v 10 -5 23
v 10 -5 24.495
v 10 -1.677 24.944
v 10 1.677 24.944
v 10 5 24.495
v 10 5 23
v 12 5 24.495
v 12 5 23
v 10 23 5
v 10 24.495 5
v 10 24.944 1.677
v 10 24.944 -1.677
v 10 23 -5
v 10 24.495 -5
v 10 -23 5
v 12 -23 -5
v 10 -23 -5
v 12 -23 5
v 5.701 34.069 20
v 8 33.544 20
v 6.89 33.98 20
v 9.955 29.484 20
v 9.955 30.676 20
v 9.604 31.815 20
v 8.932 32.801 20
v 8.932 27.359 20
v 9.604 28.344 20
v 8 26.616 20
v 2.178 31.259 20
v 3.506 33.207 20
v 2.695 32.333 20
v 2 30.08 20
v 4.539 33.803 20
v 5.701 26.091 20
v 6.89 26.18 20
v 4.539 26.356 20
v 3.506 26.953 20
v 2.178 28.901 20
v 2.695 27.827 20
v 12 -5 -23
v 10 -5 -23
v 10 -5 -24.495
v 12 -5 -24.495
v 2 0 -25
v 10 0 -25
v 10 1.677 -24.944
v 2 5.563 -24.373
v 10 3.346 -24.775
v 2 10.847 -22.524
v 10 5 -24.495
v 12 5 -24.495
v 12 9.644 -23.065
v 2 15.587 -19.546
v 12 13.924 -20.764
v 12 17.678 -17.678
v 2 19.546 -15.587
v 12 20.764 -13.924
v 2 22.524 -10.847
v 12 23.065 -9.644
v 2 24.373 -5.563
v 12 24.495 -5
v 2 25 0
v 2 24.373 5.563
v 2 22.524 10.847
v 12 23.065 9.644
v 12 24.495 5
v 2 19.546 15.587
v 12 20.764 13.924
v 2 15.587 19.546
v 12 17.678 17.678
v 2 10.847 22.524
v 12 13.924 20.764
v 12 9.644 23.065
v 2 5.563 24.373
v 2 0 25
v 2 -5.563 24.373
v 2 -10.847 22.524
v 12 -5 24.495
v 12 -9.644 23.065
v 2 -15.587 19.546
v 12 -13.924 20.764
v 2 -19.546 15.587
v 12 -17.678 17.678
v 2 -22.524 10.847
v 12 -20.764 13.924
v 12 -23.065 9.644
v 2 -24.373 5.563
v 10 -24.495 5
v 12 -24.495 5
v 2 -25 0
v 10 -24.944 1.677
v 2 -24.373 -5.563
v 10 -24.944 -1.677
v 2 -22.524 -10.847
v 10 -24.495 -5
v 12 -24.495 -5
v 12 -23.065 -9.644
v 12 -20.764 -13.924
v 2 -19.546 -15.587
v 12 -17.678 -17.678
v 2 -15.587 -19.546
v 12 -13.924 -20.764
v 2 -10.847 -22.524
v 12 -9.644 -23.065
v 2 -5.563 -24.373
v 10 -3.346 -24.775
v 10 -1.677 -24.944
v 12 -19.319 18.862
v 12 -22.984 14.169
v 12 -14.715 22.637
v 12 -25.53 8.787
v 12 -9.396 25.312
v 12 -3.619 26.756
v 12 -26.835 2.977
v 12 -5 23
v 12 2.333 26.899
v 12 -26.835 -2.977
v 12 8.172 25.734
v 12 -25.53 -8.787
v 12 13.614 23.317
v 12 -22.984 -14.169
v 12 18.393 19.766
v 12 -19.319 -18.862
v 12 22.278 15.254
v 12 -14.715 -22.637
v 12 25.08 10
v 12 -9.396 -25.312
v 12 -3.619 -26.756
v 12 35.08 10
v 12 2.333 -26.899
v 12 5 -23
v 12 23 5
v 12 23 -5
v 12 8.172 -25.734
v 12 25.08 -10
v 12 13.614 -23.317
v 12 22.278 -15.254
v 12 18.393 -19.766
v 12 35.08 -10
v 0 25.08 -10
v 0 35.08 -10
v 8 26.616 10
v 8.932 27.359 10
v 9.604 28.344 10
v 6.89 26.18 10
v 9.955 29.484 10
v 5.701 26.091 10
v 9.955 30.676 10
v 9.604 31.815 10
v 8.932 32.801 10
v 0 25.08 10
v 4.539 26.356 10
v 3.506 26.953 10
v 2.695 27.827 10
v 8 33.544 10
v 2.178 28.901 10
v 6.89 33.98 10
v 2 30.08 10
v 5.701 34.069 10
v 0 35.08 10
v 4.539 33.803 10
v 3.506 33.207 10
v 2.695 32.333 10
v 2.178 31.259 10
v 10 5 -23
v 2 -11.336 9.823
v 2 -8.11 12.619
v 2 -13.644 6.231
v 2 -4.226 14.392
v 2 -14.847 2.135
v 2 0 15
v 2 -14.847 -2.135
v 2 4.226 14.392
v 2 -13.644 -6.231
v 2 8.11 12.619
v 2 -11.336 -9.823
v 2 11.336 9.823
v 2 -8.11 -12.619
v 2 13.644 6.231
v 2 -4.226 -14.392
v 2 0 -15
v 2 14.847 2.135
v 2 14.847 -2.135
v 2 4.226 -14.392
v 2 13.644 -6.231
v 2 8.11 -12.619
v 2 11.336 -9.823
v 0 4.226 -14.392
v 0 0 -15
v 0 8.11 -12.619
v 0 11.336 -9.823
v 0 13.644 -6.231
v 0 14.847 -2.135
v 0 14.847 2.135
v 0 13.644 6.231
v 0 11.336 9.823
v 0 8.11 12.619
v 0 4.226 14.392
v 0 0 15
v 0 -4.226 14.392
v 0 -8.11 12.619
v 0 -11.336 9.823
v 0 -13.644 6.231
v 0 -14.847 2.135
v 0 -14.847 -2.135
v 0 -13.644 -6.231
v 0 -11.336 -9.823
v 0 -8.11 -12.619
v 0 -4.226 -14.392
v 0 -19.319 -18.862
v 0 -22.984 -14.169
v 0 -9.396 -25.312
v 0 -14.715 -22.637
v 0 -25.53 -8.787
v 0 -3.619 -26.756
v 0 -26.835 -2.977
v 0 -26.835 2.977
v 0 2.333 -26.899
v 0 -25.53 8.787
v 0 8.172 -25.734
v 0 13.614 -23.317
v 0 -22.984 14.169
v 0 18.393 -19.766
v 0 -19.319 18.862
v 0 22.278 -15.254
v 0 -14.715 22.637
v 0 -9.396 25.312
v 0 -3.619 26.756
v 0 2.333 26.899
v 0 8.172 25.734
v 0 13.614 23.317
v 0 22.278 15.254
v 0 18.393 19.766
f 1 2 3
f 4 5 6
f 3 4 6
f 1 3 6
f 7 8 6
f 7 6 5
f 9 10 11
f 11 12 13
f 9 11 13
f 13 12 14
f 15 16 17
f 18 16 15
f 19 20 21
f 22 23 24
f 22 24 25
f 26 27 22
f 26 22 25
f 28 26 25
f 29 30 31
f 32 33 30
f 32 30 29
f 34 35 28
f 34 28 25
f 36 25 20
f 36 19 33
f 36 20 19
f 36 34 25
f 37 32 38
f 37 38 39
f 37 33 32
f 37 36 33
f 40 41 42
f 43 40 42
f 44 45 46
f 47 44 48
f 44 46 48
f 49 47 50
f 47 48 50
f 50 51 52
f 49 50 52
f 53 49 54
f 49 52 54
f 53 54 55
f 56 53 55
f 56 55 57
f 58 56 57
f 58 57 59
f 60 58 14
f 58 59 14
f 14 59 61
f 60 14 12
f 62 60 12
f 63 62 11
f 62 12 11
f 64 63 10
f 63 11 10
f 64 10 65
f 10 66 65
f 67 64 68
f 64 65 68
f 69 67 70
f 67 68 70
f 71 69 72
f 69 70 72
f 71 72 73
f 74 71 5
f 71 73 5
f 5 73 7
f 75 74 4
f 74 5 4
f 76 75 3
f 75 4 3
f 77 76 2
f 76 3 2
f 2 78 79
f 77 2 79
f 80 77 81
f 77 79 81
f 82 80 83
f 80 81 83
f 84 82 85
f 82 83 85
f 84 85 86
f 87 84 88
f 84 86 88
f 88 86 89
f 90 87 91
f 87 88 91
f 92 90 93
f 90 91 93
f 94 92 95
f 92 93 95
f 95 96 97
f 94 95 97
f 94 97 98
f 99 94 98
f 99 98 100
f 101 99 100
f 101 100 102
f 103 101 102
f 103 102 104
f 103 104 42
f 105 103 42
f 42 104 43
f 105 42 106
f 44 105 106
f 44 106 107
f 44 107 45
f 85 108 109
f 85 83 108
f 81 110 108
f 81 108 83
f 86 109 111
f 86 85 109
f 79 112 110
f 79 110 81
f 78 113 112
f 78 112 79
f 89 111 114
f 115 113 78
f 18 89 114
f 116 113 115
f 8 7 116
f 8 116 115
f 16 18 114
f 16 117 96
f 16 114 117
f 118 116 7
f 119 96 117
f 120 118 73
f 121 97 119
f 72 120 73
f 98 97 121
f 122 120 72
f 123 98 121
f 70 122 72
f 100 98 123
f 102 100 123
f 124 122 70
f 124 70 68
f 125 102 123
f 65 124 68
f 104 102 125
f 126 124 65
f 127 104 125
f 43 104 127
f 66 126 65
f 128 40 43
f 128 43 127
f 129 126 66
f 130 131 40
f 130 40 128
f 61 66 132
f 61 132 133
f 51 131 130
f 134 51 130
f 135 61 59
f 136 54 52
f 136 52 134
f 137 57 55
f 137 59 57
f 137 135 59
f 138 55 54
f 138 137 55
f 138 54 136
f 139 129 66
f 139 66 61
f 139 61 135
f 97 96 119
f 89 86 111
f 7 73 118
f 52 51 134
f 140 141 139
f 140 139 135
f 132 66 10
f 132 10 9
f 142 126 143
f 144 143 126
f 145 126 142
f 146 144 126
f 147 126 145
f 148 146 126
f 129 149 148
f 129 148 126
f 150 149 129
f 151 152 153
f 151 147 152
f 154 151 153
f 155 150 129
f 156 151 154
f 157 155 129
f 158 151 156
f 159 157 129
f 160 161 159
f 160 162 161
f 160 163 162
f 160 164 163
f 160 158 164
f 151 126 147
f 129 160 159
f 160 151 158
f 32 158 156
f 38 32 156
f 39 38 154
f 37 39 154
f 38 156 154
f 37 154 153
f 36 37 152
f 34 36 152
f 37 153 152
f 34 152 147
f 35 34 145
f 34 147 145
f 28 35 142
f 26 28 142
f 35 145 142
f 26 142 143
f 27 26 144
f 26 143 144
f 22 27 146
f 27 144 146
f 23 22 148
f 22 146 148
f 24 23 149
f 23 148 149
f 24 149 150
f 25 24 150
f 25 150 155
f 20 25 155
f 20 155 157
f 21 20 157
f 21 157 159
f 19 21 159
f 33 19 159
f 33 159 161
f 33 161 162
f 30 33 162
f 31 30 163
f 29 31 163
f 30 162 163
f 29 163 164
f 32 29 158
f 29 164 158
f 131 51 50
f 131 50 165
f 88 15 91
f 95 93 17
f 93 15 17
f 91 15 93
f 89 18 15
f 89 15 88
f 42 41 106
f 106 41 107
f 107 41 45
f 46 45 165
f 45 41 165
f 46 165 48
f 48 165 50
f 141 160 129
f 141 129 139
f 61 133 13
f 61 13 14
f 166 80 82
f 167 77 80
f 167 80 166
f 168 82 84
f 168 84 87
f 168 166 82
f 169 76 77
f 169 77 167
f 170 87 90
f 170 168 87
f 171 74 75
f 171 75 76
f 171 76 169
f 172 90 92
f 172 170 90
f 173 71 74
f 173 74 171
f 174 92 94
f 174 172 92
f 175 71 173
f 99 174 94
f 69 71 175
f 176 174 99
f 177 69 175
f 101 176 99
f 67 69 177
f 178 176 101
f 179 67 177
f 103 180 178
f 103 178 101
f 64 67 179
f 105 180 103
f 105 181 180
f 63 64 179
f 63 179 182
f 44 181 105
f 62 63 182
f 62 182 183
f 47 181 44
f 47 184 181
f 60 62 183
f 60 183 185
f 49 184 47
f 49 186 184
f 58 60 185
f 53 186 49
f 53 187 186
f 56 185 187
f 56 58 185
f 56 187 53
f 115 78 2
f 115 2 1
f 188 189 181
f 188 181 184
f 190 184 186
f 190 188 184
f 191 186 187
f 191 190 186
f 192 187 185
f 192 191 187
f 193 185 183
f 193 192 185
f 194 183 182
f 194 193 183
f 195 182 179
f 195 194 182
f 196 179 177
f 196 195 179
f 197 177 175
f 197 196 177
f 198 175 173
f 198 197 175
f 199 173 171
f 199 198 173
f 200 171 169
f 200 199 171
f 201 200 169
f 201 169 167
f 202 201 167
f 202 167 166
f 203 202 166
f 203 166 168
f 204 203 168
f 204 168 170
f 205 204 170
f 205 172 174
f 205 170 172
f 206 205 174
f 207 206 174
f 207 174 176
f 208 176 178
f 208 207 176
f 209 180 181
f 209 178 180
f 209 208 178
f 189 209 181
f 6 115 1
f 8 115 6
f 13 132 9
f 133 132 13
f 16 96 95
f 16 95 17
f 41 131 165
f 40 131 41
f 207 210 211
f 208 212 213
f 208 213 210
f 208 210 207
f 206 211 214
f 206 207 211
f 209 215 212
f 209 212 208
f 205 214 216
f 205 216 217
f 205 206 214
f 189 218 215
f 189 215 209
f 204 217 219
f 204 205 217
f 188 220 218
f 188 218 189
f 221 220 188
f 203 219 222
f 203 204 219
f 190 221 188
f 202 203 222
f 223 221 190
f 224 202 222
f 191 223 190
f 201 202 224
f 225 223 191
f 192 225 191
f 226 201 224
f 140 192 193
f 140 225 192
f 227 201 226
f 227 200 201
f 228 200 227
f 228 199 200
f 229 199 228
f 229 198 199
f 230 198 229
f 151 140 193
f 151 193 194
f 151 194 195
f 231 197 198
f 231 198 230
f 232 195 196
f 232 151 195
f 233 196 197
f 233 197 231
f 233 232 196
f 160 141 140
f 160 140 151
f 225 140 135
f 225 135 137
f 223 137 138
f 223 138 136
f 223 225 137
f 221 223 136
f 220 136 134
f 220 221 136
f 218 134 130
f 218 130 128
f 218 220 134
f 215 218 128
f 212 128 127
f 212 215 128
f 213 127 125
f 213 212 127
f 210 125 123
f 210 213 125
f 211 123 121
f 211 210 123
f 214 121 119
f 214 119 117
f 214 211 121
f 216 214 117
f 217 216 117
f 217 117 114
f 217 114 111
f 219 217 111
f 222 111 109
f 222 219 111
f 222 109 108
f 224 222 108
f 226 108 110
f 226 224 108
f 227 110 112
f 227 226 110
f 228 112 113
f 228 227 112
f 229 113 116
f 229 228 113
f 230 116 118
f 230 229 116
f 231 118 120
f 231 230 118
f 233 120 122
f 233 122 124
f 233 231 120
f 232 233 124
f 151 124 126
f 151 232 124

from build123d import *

# Parameters (mm, degrees)
SKETCH1_R           = 15
BOSS_EXTRUDE1_DEPTH = 12
SKETCH2_R           = 25
CUT_EXTRUDE1_DEPTH  = 10
SKETCH3_R           = 4
BOSS_EXTRUDE2_DEPTH = 10
BOSS_EXTRUDE3_DEPTH = 2


with BuildPart() as part:
    # Sketch1 → Boss-Extrude1 (new body)
    with BuildSketch(Plane(origin=(0, 0, 0), x_dir=(0, 0, -1), z_dir=(1, 0, 0))):
        with BuildLine():
            Line((-10, 25.079872408), (-10, 35.079872408))
            Line((-10, 35.079872408), (10, 35.079872408))
            Line((10, 35.079872408), (10, 25.079872408))
            ThreePointArc((10, 25.079872408), (0, -27), (-10, 25.079872408))
        make_face()
        Circle(SKETCH1_R, mode=Mode.SUBTRACT)
    extrude(amount=BOSS_EXTRUDE1_DEPTH)

    # Sketch2 → Cut-Extrude1 (cut)
    with BuildSketch(Plane(origin=(12, 0, 0), x_dir=(0, 0, -1), z_dir=(1, 0, 0))):
        Circle(SKETCH2_R)
    extrude(amount=-CUT_EXTRUDE1_DEPTH, mode=Mode.SUBTRACT)

    # Sketch3 → Boss-Extrude2 (add)
    with BuildSketch(Plane.XY.offset(10)):
        with Locations(Location((6, 30.079872408, 0), (0, 0, 180))):
            Circle(SKETCH3_R)
    extrude(amount=BOSS_EXTRUDE2_DEPTH)

    # Sketch4 → Boss-Extrude3 (add)
    with BuildSketch(Plane(origin=(12, 0, 0), x_dir=(0, 0, -1), z_dir=(1, 0, 0))):
        with BuildLine():
            Line((-23, 5), (-24.494897428, 5))
            ThreePointArc((-24.494897428, 5), (-25, 0), (-24.494897428, -5))
            Line((-24.494897428, -5), (-23, -5))
            Line((-23, -5), (-23, 5))
        make_face()
        with BuildLine():
            ThreePointArc((5, 24.494897428), (0, 25), (-5, 24.494897428))
            Line((-5, 24.494897428), (-5, 23))
            Line((-5, 23), (5, 23))
            Line((5, 23), (5, 24.494897428))
        make_face()
        with BuildLine():
            ThreePointArc((25, 0), (24.873403825, 2.51272405), (24.494897428, 5))
            Line((24.494897428, 5), (23, 5))
            Line((23, 5), (23, -5))
            Line((23, -5), (24.494897428, -5))
            ThreePointArc((24.494897428, -5), (24.873403825, -2.51272405), (25, 0))
        make_face()
        with BuildLine():
            Line((-5, -23), (-5, -24.494897428))
            ThreePointArc((-5, -24.494897428), (0, -25), (5, -24.494897428))
            Line((5, -24.494897428), (5, -23))
            Line((5, -23), (-5, -23))
        make_face()
    extrude(amount=-BOSS_EXTRUDE3_DEPTH)


solid = part.part
